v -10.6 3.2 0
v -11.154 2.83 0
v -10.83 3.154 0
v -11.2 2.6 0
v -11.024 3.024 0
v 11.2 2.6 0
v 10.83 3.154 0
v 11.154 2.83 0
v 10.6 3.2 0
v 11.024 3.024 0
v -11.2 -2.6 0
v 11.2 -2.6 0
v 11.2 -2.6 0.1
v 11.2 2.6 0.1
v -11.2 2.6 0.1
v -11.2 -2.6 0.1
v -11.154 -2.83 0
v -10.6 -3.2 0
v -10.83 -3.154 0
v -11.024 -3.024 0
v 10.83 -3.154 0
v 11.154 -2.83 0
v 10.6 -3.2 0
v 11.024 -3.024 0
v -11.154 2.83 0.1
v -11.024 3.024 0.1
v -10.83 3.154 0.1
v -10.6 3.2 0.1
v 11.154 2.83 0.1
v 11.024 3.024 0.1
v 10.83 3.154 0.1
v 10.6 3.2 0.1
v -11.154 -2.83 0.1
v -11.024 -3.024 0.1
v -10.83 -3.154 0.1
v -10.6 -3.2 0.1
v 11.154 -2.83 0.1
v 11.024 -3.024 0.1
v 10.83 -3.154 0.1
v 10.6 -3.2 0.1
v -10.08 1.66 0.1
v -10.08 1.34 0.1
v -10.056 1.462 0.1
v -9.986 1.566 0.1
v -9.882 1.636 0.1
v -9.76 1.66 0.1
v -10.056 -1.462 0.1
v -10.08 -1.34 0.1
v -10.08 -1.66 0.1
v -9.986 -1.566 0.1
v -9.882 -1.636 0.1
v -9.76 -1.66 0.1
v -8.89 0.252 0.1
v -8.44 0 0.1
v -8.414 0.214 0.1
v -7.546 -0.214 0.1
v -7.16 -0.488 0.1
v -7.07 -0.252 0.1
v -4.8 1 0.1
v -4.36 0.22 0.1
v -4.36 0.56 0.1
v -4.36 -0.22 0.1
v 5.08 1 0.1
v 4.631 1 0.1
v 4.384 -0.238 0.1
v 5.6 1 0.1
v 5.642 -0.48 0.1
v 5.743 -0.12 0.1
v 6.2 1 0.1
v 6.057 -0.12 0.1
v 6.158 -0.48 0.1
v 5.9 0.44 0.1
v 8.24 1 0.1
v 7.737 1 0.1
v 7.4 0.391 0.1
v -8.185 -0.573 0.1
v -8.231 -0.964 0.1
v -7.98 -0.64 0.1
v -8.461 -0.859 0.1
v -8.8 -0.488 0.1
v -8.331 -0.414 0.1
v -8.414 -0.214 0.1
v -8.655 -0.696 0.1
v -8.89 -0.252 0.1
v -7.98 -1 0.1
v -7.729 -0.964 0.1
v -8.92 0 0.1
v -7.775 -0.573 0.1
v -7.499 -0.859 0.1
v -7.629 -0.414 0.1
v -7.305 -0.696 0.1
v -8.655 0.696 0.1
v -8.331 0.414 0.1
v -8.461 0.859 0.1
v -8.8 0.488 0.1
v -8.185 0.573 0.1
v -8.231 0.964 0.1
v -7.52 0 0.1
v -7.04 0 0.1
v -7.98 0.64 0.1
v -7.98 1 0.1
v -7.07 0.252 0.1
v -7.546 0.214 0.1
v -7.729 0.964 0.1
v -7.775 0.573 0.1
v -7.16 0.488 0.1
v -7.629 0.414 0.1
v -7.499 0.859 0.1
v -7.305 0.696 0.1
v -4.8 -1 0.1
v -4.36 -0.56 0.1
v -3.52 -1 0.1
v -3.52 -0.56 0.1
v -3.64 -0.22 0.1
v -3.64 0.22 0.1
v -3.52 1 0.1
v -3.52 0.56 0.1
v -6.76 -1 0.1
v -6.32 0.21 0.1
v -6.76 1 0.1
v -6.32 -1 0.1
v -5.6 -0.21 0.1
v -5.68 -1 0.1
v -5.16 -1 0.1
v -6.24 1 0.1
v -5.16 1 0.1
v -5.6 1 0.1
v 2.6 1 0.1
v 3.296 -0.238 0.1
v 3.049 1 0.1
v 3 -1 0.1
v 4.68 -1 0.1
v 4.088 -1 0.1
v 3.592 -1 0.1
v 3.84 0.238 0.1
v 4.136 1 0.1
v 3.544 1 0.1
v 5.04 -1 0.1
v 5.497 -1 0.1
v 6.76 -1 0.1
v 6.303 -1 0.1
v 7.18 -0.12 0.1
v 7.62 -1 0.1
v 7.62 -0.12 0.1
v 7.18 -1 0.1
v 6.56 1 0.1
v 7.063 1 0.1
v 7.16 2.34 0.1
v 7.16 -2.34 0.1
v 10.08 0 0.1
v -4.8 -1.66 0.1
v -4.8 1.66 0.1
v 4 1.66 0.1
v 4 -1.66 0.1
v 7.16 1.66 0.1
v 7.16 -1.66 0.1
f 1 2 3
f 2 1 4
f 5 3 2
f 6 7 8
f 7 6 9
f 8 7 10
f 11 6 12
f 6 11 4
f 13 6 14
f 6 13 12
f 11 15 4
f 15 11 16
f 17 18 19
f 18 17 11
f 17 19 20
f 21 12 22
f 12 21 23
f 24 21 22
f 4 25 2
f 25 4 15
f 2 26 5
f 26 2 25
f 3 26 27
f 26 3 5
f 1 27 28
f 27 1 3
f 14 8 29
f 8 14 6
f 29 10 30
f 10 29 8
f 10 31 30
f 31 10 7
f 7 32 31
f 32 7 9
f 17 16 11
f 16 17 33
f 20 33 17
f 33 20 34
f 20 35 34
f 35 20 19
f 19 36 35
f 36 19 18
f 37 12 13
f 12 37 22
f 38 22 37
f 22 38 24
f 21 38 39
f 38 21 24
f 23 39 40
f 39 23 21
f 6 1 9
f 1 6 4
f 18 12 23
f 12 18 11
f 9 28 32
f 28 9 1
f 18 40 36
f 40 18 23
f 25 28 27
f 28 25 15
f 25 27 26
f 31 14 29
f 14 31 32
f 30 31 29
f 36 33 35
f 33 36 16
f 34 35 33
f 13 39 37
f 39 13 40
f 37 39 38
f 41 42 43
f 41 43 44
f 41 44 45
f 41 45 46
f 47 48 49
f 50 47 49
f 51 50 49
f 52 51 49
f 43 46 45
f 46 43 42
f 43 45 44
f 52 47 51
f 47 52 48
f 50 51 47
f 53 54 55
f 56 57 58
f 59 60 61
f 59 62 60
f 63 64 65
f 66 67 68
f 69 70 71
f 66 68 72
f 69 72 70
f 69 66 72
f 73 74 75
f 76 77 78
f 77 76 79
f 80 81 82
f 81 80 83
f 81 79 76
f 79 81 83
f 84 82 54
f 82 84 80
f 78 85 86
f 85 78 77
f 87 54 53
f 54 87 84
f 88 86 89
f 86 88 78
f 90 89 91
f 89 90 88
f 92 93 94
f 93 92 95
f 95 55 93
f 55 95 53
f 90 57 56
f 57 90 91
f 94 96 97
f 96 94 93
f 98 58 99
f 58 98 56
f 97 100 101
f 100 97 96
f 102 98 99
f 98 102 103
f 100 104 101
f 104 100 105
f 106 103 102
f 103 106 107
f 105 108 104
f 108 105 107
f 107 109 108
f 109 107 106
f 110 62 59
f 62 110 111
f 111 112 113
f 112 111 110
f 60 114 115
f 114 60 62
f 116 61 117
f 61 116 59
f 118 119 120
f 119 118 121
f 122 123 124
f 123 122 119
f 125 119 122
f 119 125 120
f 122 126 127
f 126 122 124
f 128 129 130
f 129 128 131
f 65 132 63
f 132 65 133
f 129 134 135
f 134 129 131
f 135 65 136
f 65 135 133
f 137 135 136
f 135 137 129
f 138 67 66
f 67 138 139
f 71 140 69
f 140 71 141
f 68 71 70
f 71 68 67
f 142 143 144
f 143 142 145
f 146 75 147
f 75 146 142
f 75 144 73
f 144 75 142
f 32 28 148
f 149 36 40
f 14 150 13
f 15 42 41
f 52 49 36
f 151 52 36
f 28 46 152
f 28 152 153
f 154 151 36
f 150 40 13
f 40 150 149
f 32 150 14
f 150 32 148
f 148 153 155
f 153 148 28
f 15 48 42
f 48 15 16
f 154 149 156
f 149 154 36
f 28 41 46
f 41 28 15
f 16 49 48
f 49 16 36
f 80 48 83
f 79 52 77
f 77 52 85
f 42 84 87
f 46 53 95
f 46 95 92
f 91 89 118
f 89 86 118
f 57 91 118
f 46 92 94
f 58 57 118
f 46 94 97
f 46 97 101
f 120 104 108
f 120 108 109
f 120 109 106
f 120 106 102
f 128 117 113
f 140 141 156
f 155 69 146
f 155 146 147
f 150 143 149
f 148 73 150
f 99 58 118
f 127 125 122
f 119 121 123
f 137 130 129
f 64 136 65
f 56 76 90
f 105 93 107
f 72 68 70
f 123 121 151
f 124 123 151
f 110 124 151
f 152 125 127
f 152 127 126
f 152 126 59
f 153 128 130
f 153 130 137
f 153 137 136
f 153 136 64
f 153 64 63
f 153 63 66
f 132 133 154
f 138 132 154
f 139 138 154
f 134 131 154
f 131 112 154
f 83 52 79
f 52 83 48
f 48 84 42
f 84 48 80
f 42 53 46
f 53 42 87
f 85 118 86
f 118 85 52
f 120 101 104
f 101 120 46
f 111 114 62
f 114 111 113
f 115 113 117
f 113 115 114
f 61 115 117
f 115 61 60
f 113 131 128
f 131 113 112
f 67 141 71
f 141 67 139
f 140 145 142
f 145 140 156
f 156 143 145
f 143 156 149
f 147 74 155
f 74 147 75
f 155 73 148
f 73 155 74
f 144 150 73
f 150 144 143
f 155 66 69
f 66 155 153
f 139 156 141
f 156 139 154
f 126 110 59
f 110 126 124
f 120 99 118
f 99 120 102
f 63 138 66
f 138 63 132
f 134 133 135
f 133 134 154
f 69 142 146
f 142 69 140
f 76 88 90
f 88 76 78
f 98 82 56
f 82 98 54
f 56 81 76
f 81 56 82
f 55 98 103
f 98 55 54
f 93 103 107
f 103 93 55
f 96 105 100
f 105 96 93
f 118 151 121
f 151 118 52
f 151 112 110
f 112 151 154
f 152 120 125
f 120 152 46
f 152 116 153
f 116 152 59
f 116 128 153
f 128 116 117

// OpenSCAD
// file: ../p/box3u12.scad
use <../lib.scad>
function ldraw_lib__box3u12() = [
// 0 Box with 3 Parallel Faces without Any Edges
// 0 Name: box3u12.dat
// 0 Author: J.C. Tchang [tchang]
// 0 !LDRAW_ORG Primitive UPDATE 2014-02
// 0 !LICENSE Licensed under CC BY 4.0 : see CAreadme.txt
// 
// 0 BFC CERTIFY CCW
  [0,"BFC","CERTIFY"],
  [0,"BFC","CCW"],
// 
// 0 !HISTORY 2014-12-23 [PTadmin] Official Update 2014-02
// 
// 
// 4 16 -1 1 1 1 1 1 1 1 -1 -1 1 -1
  [4,16,-1,1,1,1,1,1,1,1,-1,-1,1,-1],
// 4 16 -1 1 1 -1 0 1 1 0 1 1 1 1
  [4,16,-1,1,1,-1,0,1,1,0,1,1,1,1],
// 4 16 1 1 -1 1 0 -1 -1 0 -1 -1 1 -1
  [4,16,1,1,-1,1,0,-1,-1,0,-1,-1,1,-1],
];
module ldraw_lib__box3u12(step=0, col=false, unit=2/5, alt=false, line=0.2, solid=!$preview)
    makepoly(ldraw_lib__box3u12(), step=step, col=col, unit=unit, alt=alt, line=line, solid=solid);
ldraw_lib__box3u12(line=0.2);
// file: ../p/1-4cyli.scad
use <../lib.scad>
function ldraw_lib__1_4cyli() = [
// 0 Cylinder 0.25
// 0 Name: 1-4cyli.dat
// 0 Author: James Jessiman
// 0 !LDRAW_ORG Primitive UPDATE 2012-01
// 0 !LICENSE Licensed under CC BY 4.0 : see CAreadme.txt
// 
// 0 BFC CERTIFY CCW
  [0,"BFC","CERTIFY"],
  [0,"BFC","CCW"],
// 
// 0 !HISTORY 2002-03-23 [sbliss] Added BFC statement.
// 0 !HISTORY 2002-04-25 [PTadmin] Official Update 2002-02
// 0 !HISTORY 2007-06-22 [PTadmin] Header formatted for Contributor Agreement
// 0 !HISTORY 2008-07-01 [PTadmin] Official Update 2008-01
// 0 !HISTORY 2012-02-16 [Philo] Changed to CCW
// 0 !HISTORY 2012-03-30 [PTadmin] Official Update 2012-01
// 
// 
// 4 16 1 1 0 0.9239 1 0.3827 0.9239 0 0.3827 1 0 0
  [4,16,1,1,0,0.9239,1,0.3827,0.9239,0,0.3827,1,0,0],
// 5 24 1 0 0 1 1 0 0.9239 0 0.3827 1 0 -1
  [5,24,1,0,0,1,1,0,0.9239,0,0.3827,1,0,-1],
// 4 16 0.9239 1 0.3827 0.7071 1 0.7071 0.7071 0 0.7071 0.9239 0 0.3827
  [4,16,0.9239,1,0.3827,0.7071,1,0.7071,0.7071,0,0.7071,0.9239,0,0.3827],
// 5 24 0.9239 0 0.3827 0.9239 1 0.3827 0.7071 0 0.7071 1 0 0
  [5,24,0.9239,0,0.3827,0.9239,1,0.3827,0.7071,0,0.7071,1,0,0],
// 4 16 0.7071 1 0.7071 0.3827 1 0.9239 0.3827 0 0.9239 0.7071 0 0.7071
  [4,16,0.7071,1,0.7071,0.3827,1,0.9239,0.3827,0,0.9239,0.7071,0,0.7071],
// 5 24 0.7071 0 0.7071 0.7071 1 0.7071 0.3827 0 0.9239 0.9239 0 0.3827
  [5,24,0.7071,0,0.7071,0.7071,1,0.7071,0.3827,0,0.9239,0.9239,0,0.3827],
// 4 16 0.3827 1 0.9239 0 1 1 0 0 1 0.3827 0 0.9239
  [4,16,0.3827,1,0.9239,0,1,1,0,0,1,0.3827,0,0.9239],
// 5 24 0.3827 0 0.9239 0.3827 1 0.9239 0 0 1 0.7071 0 0.7071
  [5,24,0.3827,0,0.9239,0.3827,1,0.9239,0,0,1,0.7071,0,0.7071],
// 5 24 0 0 1 0 1 1 0.3827 0 0.9239 -1 0 1
  [5,24,0,0,1,0,1,1,0.3827,0,0.9239,-1,0,1],
];
module ldraw_lib__1_4cyli(step=0, col=false, unit=2/5, alt=false, line=0.2, solid=!$preview)
    makepoly(ldraw_lib__1_4cyli(), step=step, col=col, unit=unit, alt=alt, line=line, solid=solid);
ldraw_lib__1_4cyli(line=0.2);
// file: s/stickerback008x028.scad
use <../../lib.scad>
use <../../p/1-4chrd.scad>
use <../../p/1-4cyli.scad>
use <../../p/box3u12.scad>
function ldraw_lib__s__stickerback008x028() = [
// 0 ~Sticker Back  0.8 x  2.8
// 0 Name: s\stickerback008x028.dat
// 0 Author: Massimo Maso [Sirio]
// 0 !LDRAW_ORG Subpart UPDATE 2025-08
// 0 !LICENSE Licensed under CC BY 4.0 : see CAreadme.txt
// 
// 0 BFC CERTIFY CCW
  [0,"BFC","CERTIFY"],
  [0,"BFC","CCW"],
// 
// 0 !HISTORY 2025-08-31 [OrionP] Official Update 2025-08
// 
// 0 // Primitives
// 1 16 -26.5 0 6.5 -1.5 0 0 0 -1 0 0 0 1.5 1-4chrd.dat
  [1,16,-26.5,0,6.5,-1.5,0,0,0,-1,0,0,0,1.5, ldraw_lib__1_4chrd()],
// 1 16 26.5 0 6.5 1.5 0 0 0 -1 0 0 0 1.5 1-4chrd.dat
  [1,16,26.5,0,6.5,1.5,0,0,0,-1,0,0,0,1.5, ldraw_lib__1_4chrd()],
// 1 16 0 -.25 0 0 0 28 0 .25 0 6.5 0 0 box3u12.dat
  [1,16,0,-.25,0,0,0,28,0,.25,0,6.5,0,0, ldraw_lib__box3u12()],
// 1 16 -26.5 0 -6.5 -1.5 0 0 0 -1 0 0 0 -1.5 1-4chrd.dat
  [1,16,-26.5,0,-6.5,-1.5,0,0,0,-1,0,0,0,-1.5, ldraw_lib__1_4chrd()],
// 1 16 26.5 0 -6.5 1.5 0 0 0 -1 0 0 0 -1.5 1-4chrd.dat
  [1,16,26.5,0,-6.5,1.5,0,0,0,-1,0,0,0,-1.5, ldraw_lib__1_4chrd()],
// 1 16 -26.5 -.25 6.5 -1.5 0 0 0 .25 0 0 0 1.5 1-4cyli.dat
  [1,16,-26.5,-.25,6.5,-1.5,0,0,0,.25,0,0,0,1.5, ldraw_lib__1_4cyli()],
// 1 16 26.5 -.25 6.5 1.5 0 0 0 .25 0 0 0 1.5 1-4cyli.dat
  [1,16,26.5,-.25,6.5,1.5,0,0,0,.25,0,0,0,1.5, ldraw_lib__1_4cyli()],
// 1 16 -26.5 -.25 -6.5 -1.5 0 0 0 .25 0 0 0 -1.5 1-4cyli.dat
  [1,16,-26.5,-.25,-6.5,-1.5,0,0,0,.25,0,0,0,-1.5, ldraw_lib__1_4cyli()],
// 1 16 26.5 -.25 -6.5 1.5 0 0 0 .25 0 0 0 -1.5 1-4cyli.dat
  [1,16,26.5,-.25,-6.5,1.5,0,0,0,.25,0,0,0,-1.5, ldraw_lib__1_4cyli()],
// 0 // Bottom face
// 4 16 -28 0 6.5 -26.5 0 8 26.5 0 8 28 0 6.5
  [4,16,-28,0,6.5,-26.5,0,8,26.5,0,8,28,0,6.5],
// 4 16 -28 0 -6.5 28 0 -6.5 26.5 0 -8 -26.5 0 -8
  [4,16,-28,0,-6.5,28,0,-6.5,26.5,0,-8,-26.5,0,-8],
// 0 // Lateral face
// 4 16 26.5 0 8 -26.5 0 8 -26.5 -.25 8 26.5 -.25 8
  [4,16,26.5,0,8,-26.5,0,8,-26.5,-.25,8,26.5,-.25,8],
// 4 16 -26.5 0 -8 26.5 0 -8 26.5 -.25 -8 -26.5 -.25 -8
  [4,16,-26.5,0,-8,26.5,0,-8,26.5,-.25,-8,-26.5,-.25,-8],
];
module ldraw_lib__s__stickerback008x028(step=0, col=false, unit=2/5, alt=false, line=0.2, solid=!$preview)
    makepoly(ldraw_lib__s__stickerback008x028(), step=step, col=col, unit=unit, alt=alt, line=line, solid=solid);
ldraw_lib__s__stickerback008x028(line=0.2);
// file: ../p/1-4ndis.scad
use <../lib.scad>
function ldraw_lib__1_4ndis() = [
// 0 Disc Negative 0.25
// 0 Name: 1-4ndis.dat
// 0 Author: James Jessiman
// 0 !LDRAW_ORG Primitive UPDATE 2012-01
// 0 !LICENSE Licensed under CC BY 4.0 : see CAreadme.txt
// 
// 0 BFC CERTIFY CCW
  [0,"BFC","CERTIFY"],
  [0,"BFC","CCW"],
// 
// 0 !HISTORY 2002-03-23 [sbliss] Added BFC Statement
// 0 !HISTORY 2002-04-25 [PTadmin] Official Update 2002-02
// 0 !HISTORY 2007-06-22 [PTadmin] Header formatted for Contributor Agreement
// 0 !HISTORY 2008-07-01 [PTadmin] Official Update 2008-01
// 0 !HISTORY 2012-02-16 [Philo] Changed to CCW
// 0 !HISTORY 2012-03-30 [PTadmin] Official Update 2012-01
// 
// 
// 3 16 0.9239 0 0.3827 1 0 0 1 0 1
  [3,16,0.9239,0,0.3827,1,0,0,1,0,1],
// 3 16 0.7071 0 0.7071 0.9239 0 0.3827 1 0 1
  [3,16,0.7071,0,0.7071,0.9239,0,0.3827,1,0,1],
// 3 16 0.3827 0 0.9239 0.7071 0 0.7071 1 0 1
  [3,16,0.3827,0,0.9239,0.7071,0,0.7071,1,0,1],
// 3 16 0 0 1 0.3827 0 0.9239 1 0 1
  [3,16,0,0,1,0.3827,0,0.9239,1,0,1],
];
module ldraw_lib__1_4ndis(step=0, col=false, unit=2/5, alt=false, line=0.2, solid=!$preview)
    makepoly(ldraw_lib__1_4ndis(), step=step, col=col, unit=unit, alt=alt, line=line, solid=solid);
ldraw_lib__1_4ndis(line=0.2);
// file: ../p/1-4chrd.scad
use <../lib.scad>
function ldraw_lib__1_4chrd() = [
// 0 Chord 0.25
// 0 Name: 1-4chrd.dat
// 0 Author: Max Martin Richter [MMR1988]
// 0 !LDRAW_ORG Primitive UPDATE 2023-05
// 0 !LICENSE Licensed under CC BY 4.0 : see CAreadme.txt
// 
// 0 BFC CERTIFY CCW
  [0,"BFC","CERTIFY"],
  [0,"BFC","CCW"],
// 
// 0 !HISTORY 2004-04-22 [PTadmin] Official Update 2004-02
// 0 !HISTORY 2007-10-09 [PTadmin] Header formatted for Contributor Agreement
// 0 !HISTORY 2008-07-01 [PTadmin] Official Update 2008-01
// 0 !HISTORY 2012-08-02 [MMR1988] Re-creation with PrimGen2 and Rectifier
// 0 !HISTORY 2012-08-09 [PTadmin] Official Update 2012-02
// 0 !HISTORY 2023-10-27 [OrionP] Change author to MMR1988 from hafhead
// 0 !HISTORY 2023-10-31 [OrionP] Official Update 2023-05
// 
// 4 16 0.9239 0 0.3827 0.3827 0 0.9239 0 0 1 1 0 0
  [4,16,0.9239,0,0.3827,0.3827,0,0.9239,0,0,1,1,0,0],
// 3 16 0.7071 0 0.7071 0.3827 0 0.9239 0.9239 0 0.3827
  [3,16,0.7071,0,0.7071,0.3827,0,0.9239,0.9239,0,0.3827],
];
module ldraw_lib__1_4chrd(step=0, col=false, unit=2/5, alt=false, line=0.2, solid=!$preview)
    makepoly(ldraw_lib__1_4chrd(), step=step, col=col, unit=unit, alt=alt, line=line, solid=solid);
ldraw_lib__1_4chrd(line=0.2);
// main file
use <../lib.scad>
use <../p/1-4chrd.scad>
use <../p/1-4ndis.scad>
use <s/stickerback008x028.scad>
function ldraw_lib__6138629y() = [
// 0 Sticker  0.8 x  2.8 with Black "ONE WAY" in White Arrow on Blue Background
// 0 Name: 6138629y.dat
// 0 Author: Chris Böhnke [KnightOfTarenta]
// 0 !LDRAW_ORG Part UPDATE 2026-02
// 0 !LICENSE Licensed under CC BY 4.0 : see CAreadme.txt
// 
// 0 BFC CERTIFY CCW
  [0,"BFC","CERTIFY"],
  [0,"BFC","CCW"],
// 
// 0 !KEYWORDS Bricklink 75827stk01, Brickowl 867395, Firehouse Headquarters
// 0 !KEYWORDS Ghostbusters, New York, Rebrickable 25233, Roadsign, set 75827
// 
// 0 !HISTORY 2024-05-15 [GeraldLasser] Added prims where appropriate, reduced numer of helper vertices
// 0 !HISTORY 2026-02-09 [KnightOfTarenta] Rewrite from Scratch, Original by Joel Barker [joel333]
// 0 !HISTORY 2026-03-06 [OrionP] Official Update 2026-02
// 
// 0 // Stickerback
// 1 16 0 0 0 1 0 0 0 1 0 0 0 1 s\stickerback008x028.dat
  [1,16,0,0,0,1,0,0,0,1,0,0,0,1, ldraw_lib__s__stickerback008x028()],
// 
// 0 // Corners
// 1 1 -26.5 -.25 6.5 -1.5 0 0 0 1 0 0 0 1.5 1-4chrd.dat
  [1,1,-26.5,-.25,6.5,-1.5,0,0,0,1,0,0,0,1.5, ldraw_lib__1_4chrd()],
// 1 1 26.5 -.25 6.5 1.5 0 0 0 1 0 0 0 1.5 1-4chrd.dat
  [1,1,26.5,-.25,6.5,1.5,0,0,0,1,0,0,0,1.5, ldraw_lib__1_4chrd()],
// 1 1 -26.5 -.25 -6.5 -1.5 0 0 0 1 0 0 0 -1.5 1-4chrd.dat
  [1,1,-26.5,-.25,-6.5,-1.5,0,0,0,1,0,0,0,-1.5, ldraw_lib__1_4chrd()],
// 1 1 26.5 -.25 -6.5 1.5 0 0 0 1 0 0 0 -1.5 1-4chrd.dat
  [1,1,26.5,-.25,-6.5,1.5,0,0,0,1,0,0,0,-1.5, ldraw_lib__1_4chrd()],
// 
// 0 // Other Primitives
// 1 1 -24.4 -.25 3.35 -.8 0 0 0 1 0 0 0 .8 1-4ndis.dat
  [1,1,-24.4,-.25,3.35,-.8,0,0,0,1,0,0,0,.8, ldraw_lib__1_4ndis()],
// 1 1 -24.4 -.25 -3.35 -.8 0 0 0 1 0 0 0 -.8 1-4ndis.dat
  [1,1,-24.4,-.25,-3.35,-.8,0,0,0,1,0,0,0,-.8, ldraw_lib__1_4ndis()],
// 1 15 -24.4 -.25 3.35 -.8 0 0 0 1 0 0 0 .8 1-4chrd.dat
  [1,15,-24.4,-.25,3.35,-.8,0,0,0,1,0,0,0,.8, ldraw_lib__1_4chrd()],
// 1 15 -24.4 -.25 -3.35 -.8 0 0 0 1 0 0 0 -.8 1-4chrd.dat
  [1,15,-24.4,-.25,-3.35,-.8,0,0,0,1,0,0,0,-.8, ldraw_lib__1_4chrd()],
// 
// 0 // Colour 0 Black
// 3 0 -22.224 -.25 .629 -21.1 -.25 0 -21.034 -.25 .536
  [3,0,-22.224,-.25,.629,-21.1,-.25,0,-21.034,-.25,.536],
// 3 0 -18.866 -.25 -.536 -17.899 -.25 -1.221 -17.676 -.25 -.629
  [3,0,-18.866,-.25,-.536,-17.899,-.25,-1.221,-17.676,-.25,-.629],
// 3 0 -12 -.25 2.5 -10.9 -.25 .55 -10.9 -.25 1.4
  [3,0,-12,-.25,2.5,-10.9,-.25,.55,-10.9,-.25,1.4],
// 3 0 -12 -.25 2.5 -10.9 -.25 -.55 -10.9 -.25 .55
  [3,0,-12,-.25,2.5,-10.9,-.25,-.55,-10.9,-.25,.55],
// 3 0 12.7 -.25 2.5 11.578 -.25 2.5 10.959 -.25 -.594
  [3,0,12.7,-.25,2.5,11.578,-.25,2.5,10.959,-.25,-.594],
// 3 0 14 -.25 2.5 14.106 -.25 -1.2 14.358 -.25 -.3
  [3,0,14,-.25,2.5,14.106,-.25,-1.2,14.358,-.25,-.3],
// 3 0 15.5 -.25 2.5 15.142 -.25 -.3 15.394 -.25 -1.2
  [3,0,15.5,-.25,2.5,15.142,-.25,-.3,15.394,-.25,-1.2],
// 3 0 14 -.25 2.5 14.358 -.25 -.3 14.75 -.25 1.099
  [3,0,14,-.25,2.5,14.358,-.25,-.3,14.75,-.25,1.099],
// 3 0 15.5 -.25 2.5 14.75 -.25 1.099 15.142 -.25 -.3
  [3,0,15.5,-.25,2.5,14.75,-.25,1.099,15.142,-.25,-.3],
// 3 0 15.5 -.25 2.5 14 -.25 2.5 14.75 -.25 1.099
  [3,0,15.5,-.25,2.5,14,-.25,2.5,14.75,-.25,1.099],
// 3 0 20.6 -.25 2.5 19.343 -.25 2.5 18.5 -.25 .978
  [3,0,20.6,-.25,2.5,19.343,-.25,2.5,18.5,-.25,.978],
// 4 0 -19.95 -.25 -1.6 -20.463 -.25 -1.432 -21.153 -.25 -2.147 -20.577 -.25 -2.409
  [4,0,-19.95,-.25,-1.6,-20.463,-.25,-1.432,-21.153,-.25,-2.147,-20.577,-.25,-2.409],
// 4 0 -21.034 -.25 -.536 -22.001 -.25 -1.221 -21.638 -.25 -1.74 -20.827 -.25 -1.034
  [4,0,-21.034,-.25,-.536,-22.001,-.25,-1.221,-21.638,-.25,-1.74,-20.827,-.25,-1.034],
// 4 0 -20.463 -.25 -1.432 -20.827 -.25 -1.034 -21.638 -.25 -1.74 -21.153 -.25 -2.147
  [4,0,-20.463,-.25,-1.432,-20.827,-.25,-1.034,-21.638,-.25,-1.74,-21.153,-.25,-2.147],
// 4 0 -21.1 -.25 0 -22.224 -.25 -.629 -22.001 -.25 -1.221 -21.034 -.25 -.536
  [4,0,-21.1,-.25,0,-22.224,-.25,-.629,-22.001,-.25,-1.221,-21.034,-.25,-.536],
// 4 0 -19.323 -.25 -2.409 -19.95 -.25 -1.6 -20.577 -.25 -2.409 -19.95 -.25 -2.5
  [4,0,-19.323,-.25,-2.409,-19.95,-.25,-1.6,-20.577,-.25,-2.409,-19.95,-.25,-2.5],
// 4 0 -22.224 -.25 .629 -22.3 -.25 0 -22.224 -.25 -.629 -21.1 -.25 0
  [4,0,-22.224,-.25,.629,-22.3,-.25,0,-22.224,-.25,-.629,-21.1,-.25,0],
// 4 0 -18.747 -.25 -2.147 -19.437 -.25 -1.432 -19.95 -.25 -1.6 -19.323 -.25 -2.409
  [4,0,-18.747,-.25,-2.147,-19.437,-.25,-1.432,-19.95,-.25,-1.6,-19.323,-.25,-2.409],
// 4 0 -19.437 -.25 -1.432 -18.747 -.25 -2.147 -18.262 -.25 -1.74 -19.073 -.25 -1.034
  [4,0,-19.437,-.25,-1.432,-18.747,-.25,-2.147,-18.262,-.25,-1.74,-19.073,-.25,-1.034],
// 4 0 -21.153 -.25 2.147 -21.638 -.25 1.74 -22.001 -.25 1.221 -20.827 -.25 1.034
  [4,0,-21.153,-.25,2.147,-21.638,-.25,1.74,-22.001,-.25,1.221,-20.827,-.25,1.034],
// 4 0 -22.224 -.25 .629 -21.034 -.25 .536 -20.827 -.25 1.034 -22.001 -.25 1.221
  [4,0,-22.224,-.25,.629,-21.034,-.25,.536,-20.827,-.25,1.034,-22.001,-.25,1.221],
// 4 0 -18.866 -.25 -.536 -19.073 -.25 -1.034 -18.262 -.25 -1.74 -17.899 -.25 -1.221
  [4,0,-18.866,-.25,-.536,-19.073,-.25,-1.034,-18.262,-.25,-1.74,-17.899,-.25,-1.221],
// 4 0 -20.577 -.25 2.409 -21.153 -.25 2.147 -20.827 -.25 1.034 -20.463 -.25 1.432
  [4,0,-20.577,-.25,2.409,-21.153,-.25,2.147,-20.827,-.25,1.034,-20.463,-.25,1.432],
// 4 0 -17.6 -.25 0 -18.8 -.25 0 -18.866 -.25 -.536 -17.676 -.25 -.629
  [4,0,-17.6,-.25,0,-18.8,-.25,0,-18.866,-.25,-.536,-17.676,-.25,-.629],
// 4 0 -19.95 -.25 2.5 -20.577 -.25 2.409 -20.463 -.25 1.432 -19.95 -.25 1.6
  [4,0,-19.95,-.25,2.5,-20.577,-.25,2.409,-20.463,-.25,1.432,-19.95,-.25,1.6],
// 4 0 -17.6 -.25 0 -17.676 -.25 .629 -18.866 -.25 .536 -18.8 -.25 0
  [4,0,-17.6,-.25,0,-17.676,-.25,.629,-18.866,-.25,.536,-18.8,-.25,0],
// 4 0 -19.437 -.25 1.432 -19.323 -.25 2.409 -19.95 -.25 2.5 -19.95 -.25 1.6
  [4,0,-19.437,-.25,1.432,-19.323,-.25,2.409,-19.95,-.25,2.5,-19.95,-.25,1.6],
// 4 0 -17.676 -.25 .629 -17.899 -.25 1.221 -19.073 -.25 1.034 -18.866 -.25 .536
  [4,0,-17.676,-.25,.629,-17.899,-.25,1.221,-19.073,-.25,1.034,-18.866,-.25,.536],
// 4 0 -19.323 -.25 2.409 -19.437 -.25 1.432 -19.073 -.25 1.034 -18.747 -.25 2.147
  [4,0,-19.323,-.25,2.409,-19.437,-.25,1.432,-19.073,-.25,1.034,-18.747,-.25,2.147],
// 4 0 -17.899 -.25 1.221 -18.262 -.25 1.74 -18.747 -.25 2.147 -19.073 -.25 1.034
  [4,0,-17.899,-.25,1.221,-18.262,-.25,1.74,-18.747,-.25,2.147,-19.073,-.25,1.034],
// 4 0 -12 -.25 2.5 -12 -.25 -2.5 -10.9 -.25 -1.4 -10.9 -.25 -.55
  [4,0,-12,-.25,2.5,-12,-.25,-2.5,-10.9,-.25,-1.4,-10.9,-.25,-.55],
// 4 0 -12 -.25 -2.5 -8.8 -.25 -2.5 -8.8 -.25 -1.4 -10.9 -.25 -1.4
  [4,0,-12,-.25,-2.5,-8.8,-.25,-2.5,-8.8,-.25,-1.4,-10.9,-.25,-1.4],
// 4 0 -9.1 -.25 -.55 -9.1 -.25 .55 -10.9 -.25 .55 -10.9 -.25 -.55
  [4,0,-9.1,-.25,-.55,-9.1,-.25,.55,-10.9,-.25,.55,-10.9,-.25,-.55],
// 4 0 -8.8 -.25 1.4 -8.8 -.25 2.5 -12 -.25 2.5 -10.9 -.25 1.4
  [4,0,-8.8,-.25,1.4,-8.8,-.25,2.5,-12,-.25,2.5,-10.9,-.25,1.4],
// 4 0 -16.9 -.25 2.5 -16.9 -.25 -2.5 -15.8 -.25 -2.5 -15.8 -.25 .525
  [4,0,-16.9,-.25,2.5,-16.9,-.25,-2.5,-15.8,-.25,-2.5,-15.8,-.25,.525],
// 4 0 -15.8 -.25 .525 -14.2 -.25 -2.5 -12.9 -.25 -2.5 -14 -.25 -.525
  [4,0,-15.8,-.25,.525,-14.2,-.25,-2.5,-12.9,-.25,-2.5,-14,-.25,-.525],
// 4 0 -14 -.25 -.525 -15.6 -.25 2.5 -16.9 -.25 2.5 -15.8 -.25 .525
  [4,0,-14,-.25,-.525,-15.6,-.25,2.5,-16.9,-.25,2.5,-15.8,-.25,.525],
// 4 0 -12.9 -.25 -2.5 -12.9 -.25 2.5 -14 -.25 2.5 -14 -.25 -.525
  [4,0,-12.9,-.25,-2.5,-12.9,-.25,2.5,-14,-.25,2.5,-14,-.25,-.525],
// 4 0 7.622 -.25 2.5 6.5 -.25 2.5 7.5 -.25 -2.5 8.241 -.25 -.594
  [4,0,7.622,-.25,2.5,6.5,-.25,2.5,7.5,-.25,-2.5,8.241,-.25,-.594],
// 4 0 10.219 -.25 -2.5 11.7 -.25 -2.5 12.7 -.25 2.5 10.959 -.25 -.594
  [4,0,10.219,-.25,-2.5,11.7,-.25,-2.5,12.7,-.25,2.5,10.959,-.25,-.594],
// 4 0 7.5 -.25 -2.5 8.981 -.25 -2.5 9.6 -.25 .594 8.241 -.25 -.594
  [4,0,7.5,-.25,-2.5,8.981,-.25,-2.5,9.6,-.25,.594,8.241,-.25,-.594],
// 4 0 10.959 -.25 -.594 10.341 -.25 2.5 9.6 -.25 .594 10.219 -.25 -2.5
  [4,0,10.959,-.25,-.594,10.341,-.25,2.5,9.6,-.25,.594,10.219,-.25,-2.5],
// 4 0 10.341 -.25 2.5 8.859 -.25 2.5 8.241 -.25 -.594 9.6 -.25 .594
  [4,0,10.341,-.25,2.5,8.859,-.25,2.5,8.241,-.25,-.594,9.6,-.25,.594],
// 4 0 12.6 -.25 -2.5 13.742 -.25 -2.5 14.106 -.25 -1.2 14 -.25 2.5
  [4,0,12.6,-.25,-2.5,13.742,-.25,-2.5,14.106,-.25,-1.2,14,-.25,2.5],
// 4 0 15.394 -.25 -1.2 15.758 -.25 -2.5 16.9 -.25 -2.5 15.5 -.25 2.5
  [4,0,15.394,-.25,-1.2,15.758,-.25,-2.5,16.9,-.25,-2.5,15.5,-.25,2.5],
// 4 0 15.394 -.25 -1.2 15.142 -.25 -.3 14.358 -.25 -.3 14.106 -.25 -1.2
  [4,0,15.394,-.25,-1.2,15.142,-.25,-.3,14.358,-.25,-.3,14.106,-.25,-1.2],
// 4 0 17.95 -.25 -.3 17.95 -.25 -2.5 19.05 -.25 -2.5 19.05 -.25 -.3
  [4,0,17.95,-.25,-.3,17.95,-.25,-2.5,19.05,-.25,-2.5,19.05,-.25,-.3],
// 4 0 17.657 -.25 2.5 16.4 -.25 2.5 17.95 -.25 -.3 18.5 -.25 .978
  [4,0,17.657,-.25,2.5,16.4,-.25,2.5,17.95,-.25,-.3,18.5,-.25,.978],
// 4 0 20.6 -.25 2.5 18.5 -.25 .978 17.95 -.25 -.3 19.05 -.25 -.3
  [4,0,20.6,-.25,2.5,18.5,-.25,.978,17.95,-.25,-.3,19.05,-.25,-.3],
// 
// 0 // Colour 1 Blue
// 3 1 26.5 -.25 8 -26.5 -.25 8 17.9 -.25 5.85
  [3,1,26.5,-.25,8,-26.5,-.25,8,17.9,-.25,5.85],
// 3 1 17.9 -.25 -5.85 -26.5 -.25 -8 26.5 -.25 -8
  [3,1,17.9,-.25,-5.85,-26.5,-.25,-8,26.5,-.25,-8],
// 3 1 28 -.25 6.5 25.2 -.25 0 28 -.25 -6.5
  [3,1,28,-.25,6.5,25.2,-.25,0,28,-.25,-6.5],
// 3 1 -28 -.25 6.5 -25.2 -.25 3.35 -25.2 -.25 4.15
  [3,1,-28,-.25,6.5,-25.2,-.25,3.35,-25.2,-.25,4.15],
// 3 1 -24.4 -.25 -4.15 -25.2 -.25 -4.15 -26.5 -.25 -8
  [3,1,-24.4,-.25,-4.15,-25.2,-.25,-4.15,-26.5,-.25,-8],
// 3 1 -12 -.25 -4.15 -24.4 -.25 -4.15 -26.5 -.25 -8
  [3,1,-12,-.25,-4.15,-24.4,-.25,-4.15,-26.5,-.25,-8],
// 3 1 -26.5 -.25 8 -24.4 -.25 4.15 -12 -.25 4.15
  [3,1,-26.5,-.25,8,-24.4,-.25,4.15,-12,-.25,4.15],
// 3 1 -26.5 -.25 8 -12 -.25 4.15 10 -.25 4.15
  [3,1,-26.5,-.25,8,-12,-.25,4.15,10,-.25,4.15],
// 3 1 10 -.25 -4.15 -12 -.25 -4.15 -26.5 -.25 -8
  [3,1,10,-.25,-4.15,-12,-.25,-4.15,-26.5,-.25,-8],
// 4 1 26.5 -.25 -8 28 -.25 -6.5 25.2 -.25 0 17.9 -.25 -5.85
  [4,1,26.5,-.25,-8,28,-.25,-6.5,25.2,-.25,0,17.9,-.25,-5.85],
// 4 1 25.2 -.25 0 28 -.25 6.5 26.5 -.25 8 17.9 -.25 5.85
  [4,1,25.2,-.25,0,28,-.25,6.5,26.5,-.25,8,17.9,-.25,5.85],
// 4 1 17.9 -.25 4.15 17.9 -.25 5.85 -26.5 -.25 8 10 -.25 4.15
  [4,1,17.9,-.25,4.15,17.9,-.25,5.85,-26.5,-.25,8,10,-.25,4.15],
// 4 1 -28 -.25 -6.5 -25.2 -.25 -3.35 -25.2 -.25 3.35 -28 -.25 6.5
  [4,1,-28,-.25,-6.5,-25.2,-.25,-3.35,-25.2,-.25,3.35,-28,-.25,6.5],
// 4 1 -26.5 -.25 -8 17.9 -.25 -5.85 17.9 -.25 -4.15 10 -.25 -4.15
  [4,1,-26.5,-.25,-8,17.9,-.25,-5.85,17.9,-.25,-4.15,10,-.25,-4.15],
// 4 1 -25.2 -.25 4.15 -24.4 -.25 4.15 -26.5 -.25 8 -28 -.25 6.5
  [4,1,-25.2,-.25,4.15,-24.4,-.25,4.15,-26.5,-.25,8,-28,-.25,6.5],
// 4 1 -25.2 -.25 -4.15 -25.2 -.25 -3.35 -28 -.25 -6.5 -26.5 -.25 -8
  [4,1,-25.2,-.25,-4.15,-25.2,-.25,-3.35,-28,-.25,-6.5,-26.5,-.25,-8],
// 
// 0 // Colour 15 White
// 3 15 -22.001 -.25 -1.221 -25.2 -.25 -3.35 -21.638 -.25 -1.74
  [3,15,-22.001,-.25,-1.221,-25.2,-.25,-3.35,-21.638,-.25,-1.74],
// 3 15 -21.153 -.25 -2.147 -24.4 -.25 -4.15 -20.577 -.25 -2.409
  [3,15,-21.153,-.25,-2.147,-24.4,-.25,-4.15,-20.577,-.25,-2.409],
// 3 15 -20.577 -.25 -2.409 -24.4 -.25 -4.15 -19.95 -.25 -2.5
  [3,15,-20.577,-.25,-2.409,-24.4,-.25,-4.15,-19.95,-.25,-2.5],
// 3 15 -25.2 -.25 3.35 -22.224 -.25 -.629 -22.3 -.25 0
  [3,15,-25.2,-.25,3.35,-22.224,-.25,-.629,-22.3,-.25,0],
// 3 15 -24.4 -.25 4.15 -22.224 -.25 .629 -22.001 -.25 1.221
  [3,15,-24.4,-.25,4.15,-22.224,-.25,.629,-22.001,-.25,1.221],
// 3 15 -24.4 -.25 4.15 -22.001 -.25 1.221 -21.638 -.25 1.74
  [3,15,-24.4,-.25,4.15,-22.001,-.25,1.221,-21.638,-.25,1.74],
// 3 15 -18.262 -.25 -1.74 -18.747 -.25 -2.147 -16.9 -.25 -2.5
  [3,15,-18.262,-.25,-1.74,-18.747,-.25,-2.147,-16.9,-.25,-2.5],
// 3 15 -18.747 -.25 -2.147 -19.323 -.25 -2.409 -16.9 -.25 -2.5
  [3,15,-18.747,-.25,-2.147,-19.323,-.25,-2.409,-16.9,-.25,-2.5],
// 3 15 -17.899 -.25 -1.221 -18.262 -.25 -1.74 -16.9 -.25 -2.5
  [3,15,-17.899,-.25,-1.221,-18.262,-.25,-1.74,-16.9,-.25,-2.5],
// 3 15 -24.4 -.25 4.15 -21.638 -.25 1.74 -21.153 -.25 2.147
  [3,15,-24.4,-.25,4.15,-21.638,-.25,1.74,-21.153,-.25,2.147],
// 3 15 -17.676 -.25 -.629 -17.899 -.25 -1.221 -16.9 -.25 -2.5
  [3,15,-17.676,-.25,-.629,-17.899,-.25,-1.221,-16.9,-.25,-2.5],
// 3 15 -24.4 -.25 4.15 -21.153 -.25 2.147 -20.577 -.25 2.409
  [3,15,-24.4,-.25,4.15,-21.153,-.25,2.147,-20.577,-.25,2.409],
// 3 15 -24.4 -.25 4.15 -20.577 -.25 2.409 -19.95 -.25 2.5
  [3,15,-24.4,-.25,4.15,-20.577,-.25,2.409,-19.95,-.25,2.5],
// 3 15 -16.9 -.25 2.5 -19.323 -.25 2.409 -18.747 -.25 2.147
  [3,15,-16.9,-.25,2.5,-19.323,-.25,2.409,-18.747,-.25,2.147],
// 3 15 -16.9 -.25 2.5 -18.747 -.25 2.147 -18.262 -.25 1.74
  [3,15,-16.9,-.25,2.5,-18.747,-.25,2.147,-18.262,-.25,1.74],
// 3 15 -16.9 -.25 2.5 -18.262 -.25 1.74 -17.899 -.25 1.221
  [3,15,-16.9,-.25,2.5,-18.262,-.25,1.74,-17.899,-.25,1.221],
// 3 15 -16.9 -.25 2.5 -17.899 -.25 1.221 -17.676 -.25 .629
  [3,15,-16.9,-.25,2.5,-17.899,-.25,1.221,-17.676,-.25,.629],
// 3 15 6.5 -.25 2.5 -8.8 -.25 1.4 -8.8 -.25 -1.4
  [3,15,6.5,-.25,2.5,-8.8,-.25,1.4,-8.8,-.25,-1.4],
// 3 15 16.9 -.25 -2.5 15.758 -.25 -2.5 17.9 -.25 -4.15
  [3,15,16.9,-.25,-2.5,15.758,-.25,-2.5,17.9,-.25,-4.15],
// 3 15 17.9 -.25 4.15 15.5 -.25 2.5 16.4 -.25 2.5
  [3,15,17.9,-.25,4.15,15.5,-.25,2.5,16.4,-.25,2.5],
// 3 15 17.9 -.25 4.15 16.4 -.25 2.5 17.657 -.25 2.5
  [3,15,17.9,-.25,4.15,16.4,-.25,2.5,17.657,-.25,2.5],
// 3 15 25.2 -.25 0 19.05 -.25 -2.5 17.9 -.25 -5.85
  [3,15,25.2,-.25,0,19.05,-.25,-2.5,17.9,-.25,-5.85],
// 3 15 17.9 -.25 5.85 20.6 -.25 2.5 25.2 -.25 0
  [3,15,17.9,-.25,5.85,20.6,-.25,2.5,25.2,-.25,0],
// 3 15 -17.6 -.25 0 -17.676 -.25 -.629 -16.9 -.25 -2.5
  [3,15,-17.6,-.25,0,-17.676,-.25,-.629,-16.9,-.25,-2.5],
// 3 15 -14 -.25 2.5 -15.6 -.25 2.5 -14 -.25 -.525
  [3,15,-14,-.25,2.5,-15.6,-.25,2.5,-14,-.25,-.525],
// 3 15 -15.8 -.25 .525 -15.8 -.25 -2.5 -14.2 -.25 -2.5
  [3,15,-15.8,-.25,.525,-15.8,-.25,-2.5,-14.2,-.25,-2.5],
// 3 15 8.859 -.25 2.5 7.622 -.25 2.5 8.241 -.25 -.594
  [3,15,8.859,-.25,2.5,7.622,-.25,2.5,8.241,-.25,-.594],
// 3 15 11.578 -.25 2.5 10.341 -.25 2.5 10.959 -.25 -.594
  [3,15,11.578,-.25,2.5,10.341,-.25,2.5,10.959,-.25,-.594],
// 3 15 -18.866 -.25 -.536 -20.463 -.25 -1.432 -19.073 -.25 -1.034
  [3,15,-18.866,-.25,-.536,-20.463,-.25,-1.432,-19.073,-.25,-1.034],
// 3 15 -19.437 -.25 1.432 -20.827 -.25 1.034 -19.073 -.25 1.034
  [3,15,-19.437,-.25,1.432,-20.827,-.25,1.034,-19.073,-.25,1.034],
// 3 15 14.75 -.25 1.099 14.358 -.25 -.3 15.142 -.25 -.3
  [3,15,14.75,-.25,1.099,14.358,-.25,-.3,15.142,-.25,-.3],
// 3 15 -14.2 -.25 -2.5 -15.8 -.25 -2.5 -12 -.25 -4.15
  [3,15,-14.2,-.25,-2.5,-15.8,-.25,-2.5,-12,-.25,-4.15],
// 3 15 -12.9 -.25 -2.5 -14.2 -.25 -2.5 -12 -.25 -4.15
  [3,15,-12.9,-.25,-2.5,-14.2,-.25,-2.5,-12,-.25,-4.15],
// 3 15 -12 -.25 -2.5 -12.9 -.25 -2.5 -12 -.25 -4.15
  [3,15,-12,-.25,-2.5,-12.9,-.25,-2.5,-12,-.25,-4.15],
// 3 15 -12 -.25 4.15 -15.6 -.25 2.5 -14 -.25 2.5
  [3,15,-12,-.25,4.15,-15.6,-.25,2.5,-14,-.25,2.5],
// 3 15 -12 -.25 4.15 -14 -.25 2.5 -12.9 -.25 2.5
  [3,15,-12,-.25,4.15,-14,-.25,2.5,-12.9,-.25,2.5],
// 3 15 -12 -.25 4.15 -12.9 -.25 2.5 -12 -.25 2.5
  [3,15,-12,-.25,4.15,-12.9,-.25,2.5,-12,-.25,2.5],
// 3 15 10 -.25 4.15 6.5 -.25 2.5 7.622 -.25 2.5
  [3,15,10,-.25,4.15,6.5,-.25,2.5,7.622,-.25,2.5],
// 3 15 10 -.25 4.15 7.622 -.25 2.5 8.859 -.25 2.5
  [3,15,10,-.25,4.15,7.622,-.25,2.5,8.859,-.25,2.5],
// 3 15 10 -.25 4.15 8.859 -.25 2.5 10.341 -.25 2.5
  [3,15,10,-.25,4.15,8.859,-.25,2.5,10.341,-.25,2.5],
// 3 15 10 -.25 4.15 10.341 -.25 2.5 11.578 -.25 2.5
  [3,15,10,-.25,4.15,10.341,-.25,2.5,11.578,-.25,2.5],
// 3 15 10 -.25 4.15 11.578 -.25 2.5 12.7 -.25 2.5
  [3,15,10,-.25,4.15,11.578,-.25,2.5,12.7,-.25,2.5],
// 3 15 10 -.25 4.15 12.7 -.25 2.5 14 -.25 2.5
  [3,15,10,-.25,4.15,12.7,-.25,2.5,14,-.25,2.5],
// 3 15 11.7 -.25 -2.5 10.219 -.25 -2.5 10 -.25 -4.15
  [3,15,11.7,-.25,-2.5,10.219,-.25,-2.5,10,-.25,-4.15],
// 3 15 12.6 -.25 -2.5 11.7 -.25 -2.5 10 -.25 -4.15
  [3,15,12.6,-.25,-2.5,11.7,-.25,-2.5,10,-.25,-4.15],
// 3 15 13.742 -.25 -2.5 12.6 -.25 -2.5 10 -.25 -4.15
  [3,15,13.742,-.25,-2.5,12.6,-.25,-2.5,10,-.25,-4.15],
// 3 15 8.981 -.25 -2.5 7.5 -.25 -2.5 10 -.25 -4.15
  [3,15,8.981,-.25,-2.5,7.5,-.25,-2.5,10,-.25,-4.15],
// 3 15 7.5 -.25 -2.5 -8.8 -.25 -2.5 10 -.25 -4.15
  [3,15,7.5,-.25,-2.5,-8.8,-.25,-2.5,10,-.25,-4.15],
// 4 15 -24.4 -.25 -4.15 -21.153 -.25 -2.147 -21.638 -.25 -1.74 -25.2 -.25 -3.35
  [4,15,-24.4,-.25,-4.15,-21.153,-.25,-2.147,-21.638,-.25,-1.74,-25.2,-.25,-3.35],
// 4 15 -25.2 -.25 -3.35 -22.001 -.25 -1.221 -22.224 -.25 -.629 -25.2 -.25 3.35
  [4,15,-25.2,-.25,-3.35,-22.001,-.25,-1.221,-22.224,-.25,-.629,-25.2,-.25,3.35],
// 4 15 -25.2 -.25 3.35 -22.3 -.25 0 -22.224 -.25 .629 -24.4 -.25 4.15
  [4,15,-25.2,-.25,3.35,-22.3,-.25,0,-22.224,-.25,.629,-24.4,-.25,4.15],
// 4 15 -19.323 -.25 -2.409 -19.95 -.25 -2.5 -24.4 -.25 -4.15 -16.9 -.25 -2.5
  [4,15,-19.323,-.25,-2.409,-19.95,-.25,-2.5,-24.4,-.25,-4.15,-16.9,-.25,-2.5],
// 4 15 -24.4 -.25 4.15 -19.95 -.25 2.5 -19.323 -.25 2.409 -16.9 -.25 2.5
  [4,15,-24.4,-.25,4.15,-19.95,-.25,2.5,-19.323,-.25,2.409,-16.9,-.25,2.5],
// 4 15 -10.9 -.25 -.55 -10.9 -.25 -1.4 -8.8 -.25 -1.4 -9.1 -.25 -.55
  [4,15,-10.9,-.25,-.55,-10.9,-.25,-1.4,-8.8,-.25,-1.4,-9.1,-.25,-.55],
// 4 15 -9.1 -.25 .55 -9.1 -.25 -.55 -8.8 -.25 -1.4 -8.8 -.25 1.4
  [4,15,-9.1,-.25,.55,-9.1,-.25,-.55,-8.8,-.25,-1.4,-8.8,-.25,1.4],
// 4 15 -10.9 -.25 .55 -9.1 -.25 .55 -8.8 -.25 1.4 -10.9 -.25 1.4
  [4,15,-10.9,-.25,.55,-9.1,-.25,.55,-8.8,-.25,1.4,-10.9,-.25,1.4],
// 4 15 6.5 -.25 2.5 -8.8 -.25 -1.4 -8.8 -.25 -2.5 7.5 -.25 -2.5
  [4,15,6.5,-.25,2.5,-8.8,-.25,-1.4,-8.8,-.25,-2.5,7.5,-.25,-2.5],
// 4 15 15.394 -.25 -1.2 14.106 -.25 -1.2 13.742 -.25 -2.5 15.758 -.25 -2.5
  [4,15,15.394,-.25,-1.2,14.106,-.25,-1.2,13.742,-.25,-2.5,15.758,-.25,-2.5],
// 4 15 16.9 -.25 -2.5 17.9 -.25 -4.15 17.95 -.25 -2.5 17.95 -.25 -.3
  [4,15,16.9,-.25,-2.5,17.9,-.25,-4.15,17.95,-.25,-2.5,17.95,-.25,-.3],
// 4 15 17.9 -.25 -4.15 17.9 -.25 -5.85 19.05 -.25 -2.5 17.95 -.25 -2.5
  [4,15,17.9,-.25,-4.15,17.9,-.25,-5.85,19.05,-.25,-2.5,17.95,-.25,-2.5],
// 4 15 18.5 -.25 .978 19.343 -.25 2.5 17.9 -.25 4.15 17.657 -.25 2.5
  [4,15,18.5,-.25,.978,19.343,-.25,2.5,17.9,-.25,4.15,17.657,-.25,2.5],
// 4 15 19.343 -.25 2.5 20.6 -.25 2.5 17.9 -.25 5.85 17.9 -.25 4.15
  [4,15,19.343,-.25,2.5,20.6,-.25,2.5,17.9,-.25,5.85,17.9,-.25,4.15],
// 4 15 20.6 -.25 2.5 19.05 -.25 -.3 19.05 -.25 -2.5 25.2 -.25 0
  [4,15,20.6,-.25,2.5,19.05,-.25,-.3,19.05,-.25,-2.5,25.2,-.25,0],
// 4 15 14 -.25 2.5 15.5 -.25 2.5 17.9 -.25 4.15 10 -.25 4.15
  [4,15,14,-.25,2.5,15.5,-.25,2.5,17.9,-.25,4.15,10,-.25,4.15],
// 4 15 17.9 -.25 -4.15 15.758 -.25 -2.5 13.742 -.25 -2.5 10 -.25 -4.15
  [4,15,17.9,-.25,-4.15,15.758,-.25,-2.5,13.742,-.25,-2.5,10,-.25,-4.15],
// 4 15 -12.9 -.25 -2.5 -12 -.25 -2.5 -12 -.25 2.5 -12.9 -.25 2.5
  [4,15,-12.9,-.25,-2.5,-12,-.25,-2.5,-12,-.25,2.5,-12.9,-.25,2.5],
// 4 15 -16.9 -.25 -2.5 -16.9 -.25 2.5 -17.676 -.25 .629 -17.6 -.25 0
  [4,15,-16.9,-.25,-2.5,-16.9,-.25,2.5,-17.676,-.25,.629,-17.6,-.25,0],
// 4 15 11.7 -.25 -2.5 12.6 -.25 -2.5 14 -.25 2.5 12.7 -.25 2.5
  [4,15,11.7,-.25,-2.5,12.6,-.25,-2.5,14,-.25,2.5,12.7,-.25,2.5],
// 4 15 10.219 -.25 -2.5 9.6 -.25 .594 8.981 -.25 -2.5 10 -.25 -4.15
  [4,15,10.219,-.25,-2.5,9.6,-.25,.594,8.981,-.25,-2.5,10,-.25,-4.15],
// 4 15 15.5 -.25 2.5 16.9 -.25 -2.5 17.95 -.25 -.3 16.4 -.25 2.5
  [4,15,15.5,-.25,2.5,16.9,-.25,-2.5,17.95,-.25,-.3,16.4,-.25,2.5],
// 4 15 -19.95 -.25 -1.6 -19.437 -.25 -1.432 -19.073 -.25 -1.034 -20.463 -.25 -1.432
  [4,15,-19.95,-.25,-1.6,-19.437,-.25,-1.432,-19.073,-.25,-1.034,-20.463,-.25,-1.432],
// 4 15 -18.8 -.25 0 -21.1 -.25 0 -21.034 -.25 -.536 -18.866 -.25 -.536
  [4,15,-18.8,-.25,0,-21.1,-.25,0,-21.034,-.25,-.536,-18.866,-.25,-.536],
// 4 15 -18.866 -.25 -.536 -21.034 -.25 -.536 -20.827 -.25 -1.034 -20.463 -.25 -1.432
  [4,15,-18.866,-.25,-.536,-21.034,-.25,-.536,-20.827,-.25,-1.034,-20.463,-.25,-1.432],
// 4 15 -21.034 -.25 .536 -21.1 -.25 0 -18.8 -.25 0 -18.866 -.25 .536
  [4,15,-21.034,-.25,.536,-21.1,-.25,0,-18.8,-.25,0,-18.866,-.25,.536],
// 4 15 -18.866 -.25 .536 -19.073 -.25 1.034 -20.827 -.25 1.034 -21.034 -.25 .536
  [4,15,-18.866,-.25,.536,-19.073,-.25,1.034,-20.827,-.25,1.034,-21.034,-.25,.536],
// 4 15 -19.95 -.25 1.6 -20.463 -.25 1.432 -20.827 -.25 1.034 -19.437 -.25 1.432
  [4,15,-19.95,-.25,1.6,-20.463,-.25,1.432,-20.827,-.25,1.034,-19.437,-.25,1.432],
// 4 15 -16.9 -.25 -2.5 -24.4 -.25 -4.15 -12 -.25 -4.15 -15.8 -.25 -2.5
  [4,15,-16.9,-.25,-2.5,-24.4,-.25,-4.15,-12,-.25,-4.15,-15.8,-.25,-2.5],
// 4 15 -8.8 -.25 -2.5 -12 -.25 -2.5 -12 -.25 -4.15 10 -.25 -4.15
  [4,15,-8.8,-.25,-2.5,-12,-.25,-2.5,-12,-.25,-4.15,10,-.25,-4.15],
// 4 15 -24.4 -.25 4.15 -16.9 -.25 2.5 -15.6 -.25 2.5 -12 -.25 4.15
  [4,15,-24.4,-.25,4.15,-16.9,-.25,2.5,-15.6,-.25,2.5,-12,-.25,4.15],
// 4 15 -12 -.25 4.15 -12 -.25 2.5 -8.8 -.25 2.5 10 -.25 4.15
  [4,15,-12,-.25,4.15,-12,-.25,2.5,-8.8,-.25,2.5,10,-.25,4.15],
// 4 15 -8.8 -.25 2.5 -8.8 -.25 1.4 6.5 -.25 2.5 10 -.25 4.15
  [4,15,-8.8,-.25,2.5,-8.8,-.25,1.4,6.5,-.25,2.5,10,-.25,4.15],
];
module ldraw_lib__6138629y(step=0, col=false, unit=2/5, alt=false, line=0.2, solid=!$preview)
    makepoly(ldraw_lib__6138629y(), step=step, col=col, unit=unit, alt=alt, line=line, solid=solid);
ldraw_lib__6138629y(line=0.2);
